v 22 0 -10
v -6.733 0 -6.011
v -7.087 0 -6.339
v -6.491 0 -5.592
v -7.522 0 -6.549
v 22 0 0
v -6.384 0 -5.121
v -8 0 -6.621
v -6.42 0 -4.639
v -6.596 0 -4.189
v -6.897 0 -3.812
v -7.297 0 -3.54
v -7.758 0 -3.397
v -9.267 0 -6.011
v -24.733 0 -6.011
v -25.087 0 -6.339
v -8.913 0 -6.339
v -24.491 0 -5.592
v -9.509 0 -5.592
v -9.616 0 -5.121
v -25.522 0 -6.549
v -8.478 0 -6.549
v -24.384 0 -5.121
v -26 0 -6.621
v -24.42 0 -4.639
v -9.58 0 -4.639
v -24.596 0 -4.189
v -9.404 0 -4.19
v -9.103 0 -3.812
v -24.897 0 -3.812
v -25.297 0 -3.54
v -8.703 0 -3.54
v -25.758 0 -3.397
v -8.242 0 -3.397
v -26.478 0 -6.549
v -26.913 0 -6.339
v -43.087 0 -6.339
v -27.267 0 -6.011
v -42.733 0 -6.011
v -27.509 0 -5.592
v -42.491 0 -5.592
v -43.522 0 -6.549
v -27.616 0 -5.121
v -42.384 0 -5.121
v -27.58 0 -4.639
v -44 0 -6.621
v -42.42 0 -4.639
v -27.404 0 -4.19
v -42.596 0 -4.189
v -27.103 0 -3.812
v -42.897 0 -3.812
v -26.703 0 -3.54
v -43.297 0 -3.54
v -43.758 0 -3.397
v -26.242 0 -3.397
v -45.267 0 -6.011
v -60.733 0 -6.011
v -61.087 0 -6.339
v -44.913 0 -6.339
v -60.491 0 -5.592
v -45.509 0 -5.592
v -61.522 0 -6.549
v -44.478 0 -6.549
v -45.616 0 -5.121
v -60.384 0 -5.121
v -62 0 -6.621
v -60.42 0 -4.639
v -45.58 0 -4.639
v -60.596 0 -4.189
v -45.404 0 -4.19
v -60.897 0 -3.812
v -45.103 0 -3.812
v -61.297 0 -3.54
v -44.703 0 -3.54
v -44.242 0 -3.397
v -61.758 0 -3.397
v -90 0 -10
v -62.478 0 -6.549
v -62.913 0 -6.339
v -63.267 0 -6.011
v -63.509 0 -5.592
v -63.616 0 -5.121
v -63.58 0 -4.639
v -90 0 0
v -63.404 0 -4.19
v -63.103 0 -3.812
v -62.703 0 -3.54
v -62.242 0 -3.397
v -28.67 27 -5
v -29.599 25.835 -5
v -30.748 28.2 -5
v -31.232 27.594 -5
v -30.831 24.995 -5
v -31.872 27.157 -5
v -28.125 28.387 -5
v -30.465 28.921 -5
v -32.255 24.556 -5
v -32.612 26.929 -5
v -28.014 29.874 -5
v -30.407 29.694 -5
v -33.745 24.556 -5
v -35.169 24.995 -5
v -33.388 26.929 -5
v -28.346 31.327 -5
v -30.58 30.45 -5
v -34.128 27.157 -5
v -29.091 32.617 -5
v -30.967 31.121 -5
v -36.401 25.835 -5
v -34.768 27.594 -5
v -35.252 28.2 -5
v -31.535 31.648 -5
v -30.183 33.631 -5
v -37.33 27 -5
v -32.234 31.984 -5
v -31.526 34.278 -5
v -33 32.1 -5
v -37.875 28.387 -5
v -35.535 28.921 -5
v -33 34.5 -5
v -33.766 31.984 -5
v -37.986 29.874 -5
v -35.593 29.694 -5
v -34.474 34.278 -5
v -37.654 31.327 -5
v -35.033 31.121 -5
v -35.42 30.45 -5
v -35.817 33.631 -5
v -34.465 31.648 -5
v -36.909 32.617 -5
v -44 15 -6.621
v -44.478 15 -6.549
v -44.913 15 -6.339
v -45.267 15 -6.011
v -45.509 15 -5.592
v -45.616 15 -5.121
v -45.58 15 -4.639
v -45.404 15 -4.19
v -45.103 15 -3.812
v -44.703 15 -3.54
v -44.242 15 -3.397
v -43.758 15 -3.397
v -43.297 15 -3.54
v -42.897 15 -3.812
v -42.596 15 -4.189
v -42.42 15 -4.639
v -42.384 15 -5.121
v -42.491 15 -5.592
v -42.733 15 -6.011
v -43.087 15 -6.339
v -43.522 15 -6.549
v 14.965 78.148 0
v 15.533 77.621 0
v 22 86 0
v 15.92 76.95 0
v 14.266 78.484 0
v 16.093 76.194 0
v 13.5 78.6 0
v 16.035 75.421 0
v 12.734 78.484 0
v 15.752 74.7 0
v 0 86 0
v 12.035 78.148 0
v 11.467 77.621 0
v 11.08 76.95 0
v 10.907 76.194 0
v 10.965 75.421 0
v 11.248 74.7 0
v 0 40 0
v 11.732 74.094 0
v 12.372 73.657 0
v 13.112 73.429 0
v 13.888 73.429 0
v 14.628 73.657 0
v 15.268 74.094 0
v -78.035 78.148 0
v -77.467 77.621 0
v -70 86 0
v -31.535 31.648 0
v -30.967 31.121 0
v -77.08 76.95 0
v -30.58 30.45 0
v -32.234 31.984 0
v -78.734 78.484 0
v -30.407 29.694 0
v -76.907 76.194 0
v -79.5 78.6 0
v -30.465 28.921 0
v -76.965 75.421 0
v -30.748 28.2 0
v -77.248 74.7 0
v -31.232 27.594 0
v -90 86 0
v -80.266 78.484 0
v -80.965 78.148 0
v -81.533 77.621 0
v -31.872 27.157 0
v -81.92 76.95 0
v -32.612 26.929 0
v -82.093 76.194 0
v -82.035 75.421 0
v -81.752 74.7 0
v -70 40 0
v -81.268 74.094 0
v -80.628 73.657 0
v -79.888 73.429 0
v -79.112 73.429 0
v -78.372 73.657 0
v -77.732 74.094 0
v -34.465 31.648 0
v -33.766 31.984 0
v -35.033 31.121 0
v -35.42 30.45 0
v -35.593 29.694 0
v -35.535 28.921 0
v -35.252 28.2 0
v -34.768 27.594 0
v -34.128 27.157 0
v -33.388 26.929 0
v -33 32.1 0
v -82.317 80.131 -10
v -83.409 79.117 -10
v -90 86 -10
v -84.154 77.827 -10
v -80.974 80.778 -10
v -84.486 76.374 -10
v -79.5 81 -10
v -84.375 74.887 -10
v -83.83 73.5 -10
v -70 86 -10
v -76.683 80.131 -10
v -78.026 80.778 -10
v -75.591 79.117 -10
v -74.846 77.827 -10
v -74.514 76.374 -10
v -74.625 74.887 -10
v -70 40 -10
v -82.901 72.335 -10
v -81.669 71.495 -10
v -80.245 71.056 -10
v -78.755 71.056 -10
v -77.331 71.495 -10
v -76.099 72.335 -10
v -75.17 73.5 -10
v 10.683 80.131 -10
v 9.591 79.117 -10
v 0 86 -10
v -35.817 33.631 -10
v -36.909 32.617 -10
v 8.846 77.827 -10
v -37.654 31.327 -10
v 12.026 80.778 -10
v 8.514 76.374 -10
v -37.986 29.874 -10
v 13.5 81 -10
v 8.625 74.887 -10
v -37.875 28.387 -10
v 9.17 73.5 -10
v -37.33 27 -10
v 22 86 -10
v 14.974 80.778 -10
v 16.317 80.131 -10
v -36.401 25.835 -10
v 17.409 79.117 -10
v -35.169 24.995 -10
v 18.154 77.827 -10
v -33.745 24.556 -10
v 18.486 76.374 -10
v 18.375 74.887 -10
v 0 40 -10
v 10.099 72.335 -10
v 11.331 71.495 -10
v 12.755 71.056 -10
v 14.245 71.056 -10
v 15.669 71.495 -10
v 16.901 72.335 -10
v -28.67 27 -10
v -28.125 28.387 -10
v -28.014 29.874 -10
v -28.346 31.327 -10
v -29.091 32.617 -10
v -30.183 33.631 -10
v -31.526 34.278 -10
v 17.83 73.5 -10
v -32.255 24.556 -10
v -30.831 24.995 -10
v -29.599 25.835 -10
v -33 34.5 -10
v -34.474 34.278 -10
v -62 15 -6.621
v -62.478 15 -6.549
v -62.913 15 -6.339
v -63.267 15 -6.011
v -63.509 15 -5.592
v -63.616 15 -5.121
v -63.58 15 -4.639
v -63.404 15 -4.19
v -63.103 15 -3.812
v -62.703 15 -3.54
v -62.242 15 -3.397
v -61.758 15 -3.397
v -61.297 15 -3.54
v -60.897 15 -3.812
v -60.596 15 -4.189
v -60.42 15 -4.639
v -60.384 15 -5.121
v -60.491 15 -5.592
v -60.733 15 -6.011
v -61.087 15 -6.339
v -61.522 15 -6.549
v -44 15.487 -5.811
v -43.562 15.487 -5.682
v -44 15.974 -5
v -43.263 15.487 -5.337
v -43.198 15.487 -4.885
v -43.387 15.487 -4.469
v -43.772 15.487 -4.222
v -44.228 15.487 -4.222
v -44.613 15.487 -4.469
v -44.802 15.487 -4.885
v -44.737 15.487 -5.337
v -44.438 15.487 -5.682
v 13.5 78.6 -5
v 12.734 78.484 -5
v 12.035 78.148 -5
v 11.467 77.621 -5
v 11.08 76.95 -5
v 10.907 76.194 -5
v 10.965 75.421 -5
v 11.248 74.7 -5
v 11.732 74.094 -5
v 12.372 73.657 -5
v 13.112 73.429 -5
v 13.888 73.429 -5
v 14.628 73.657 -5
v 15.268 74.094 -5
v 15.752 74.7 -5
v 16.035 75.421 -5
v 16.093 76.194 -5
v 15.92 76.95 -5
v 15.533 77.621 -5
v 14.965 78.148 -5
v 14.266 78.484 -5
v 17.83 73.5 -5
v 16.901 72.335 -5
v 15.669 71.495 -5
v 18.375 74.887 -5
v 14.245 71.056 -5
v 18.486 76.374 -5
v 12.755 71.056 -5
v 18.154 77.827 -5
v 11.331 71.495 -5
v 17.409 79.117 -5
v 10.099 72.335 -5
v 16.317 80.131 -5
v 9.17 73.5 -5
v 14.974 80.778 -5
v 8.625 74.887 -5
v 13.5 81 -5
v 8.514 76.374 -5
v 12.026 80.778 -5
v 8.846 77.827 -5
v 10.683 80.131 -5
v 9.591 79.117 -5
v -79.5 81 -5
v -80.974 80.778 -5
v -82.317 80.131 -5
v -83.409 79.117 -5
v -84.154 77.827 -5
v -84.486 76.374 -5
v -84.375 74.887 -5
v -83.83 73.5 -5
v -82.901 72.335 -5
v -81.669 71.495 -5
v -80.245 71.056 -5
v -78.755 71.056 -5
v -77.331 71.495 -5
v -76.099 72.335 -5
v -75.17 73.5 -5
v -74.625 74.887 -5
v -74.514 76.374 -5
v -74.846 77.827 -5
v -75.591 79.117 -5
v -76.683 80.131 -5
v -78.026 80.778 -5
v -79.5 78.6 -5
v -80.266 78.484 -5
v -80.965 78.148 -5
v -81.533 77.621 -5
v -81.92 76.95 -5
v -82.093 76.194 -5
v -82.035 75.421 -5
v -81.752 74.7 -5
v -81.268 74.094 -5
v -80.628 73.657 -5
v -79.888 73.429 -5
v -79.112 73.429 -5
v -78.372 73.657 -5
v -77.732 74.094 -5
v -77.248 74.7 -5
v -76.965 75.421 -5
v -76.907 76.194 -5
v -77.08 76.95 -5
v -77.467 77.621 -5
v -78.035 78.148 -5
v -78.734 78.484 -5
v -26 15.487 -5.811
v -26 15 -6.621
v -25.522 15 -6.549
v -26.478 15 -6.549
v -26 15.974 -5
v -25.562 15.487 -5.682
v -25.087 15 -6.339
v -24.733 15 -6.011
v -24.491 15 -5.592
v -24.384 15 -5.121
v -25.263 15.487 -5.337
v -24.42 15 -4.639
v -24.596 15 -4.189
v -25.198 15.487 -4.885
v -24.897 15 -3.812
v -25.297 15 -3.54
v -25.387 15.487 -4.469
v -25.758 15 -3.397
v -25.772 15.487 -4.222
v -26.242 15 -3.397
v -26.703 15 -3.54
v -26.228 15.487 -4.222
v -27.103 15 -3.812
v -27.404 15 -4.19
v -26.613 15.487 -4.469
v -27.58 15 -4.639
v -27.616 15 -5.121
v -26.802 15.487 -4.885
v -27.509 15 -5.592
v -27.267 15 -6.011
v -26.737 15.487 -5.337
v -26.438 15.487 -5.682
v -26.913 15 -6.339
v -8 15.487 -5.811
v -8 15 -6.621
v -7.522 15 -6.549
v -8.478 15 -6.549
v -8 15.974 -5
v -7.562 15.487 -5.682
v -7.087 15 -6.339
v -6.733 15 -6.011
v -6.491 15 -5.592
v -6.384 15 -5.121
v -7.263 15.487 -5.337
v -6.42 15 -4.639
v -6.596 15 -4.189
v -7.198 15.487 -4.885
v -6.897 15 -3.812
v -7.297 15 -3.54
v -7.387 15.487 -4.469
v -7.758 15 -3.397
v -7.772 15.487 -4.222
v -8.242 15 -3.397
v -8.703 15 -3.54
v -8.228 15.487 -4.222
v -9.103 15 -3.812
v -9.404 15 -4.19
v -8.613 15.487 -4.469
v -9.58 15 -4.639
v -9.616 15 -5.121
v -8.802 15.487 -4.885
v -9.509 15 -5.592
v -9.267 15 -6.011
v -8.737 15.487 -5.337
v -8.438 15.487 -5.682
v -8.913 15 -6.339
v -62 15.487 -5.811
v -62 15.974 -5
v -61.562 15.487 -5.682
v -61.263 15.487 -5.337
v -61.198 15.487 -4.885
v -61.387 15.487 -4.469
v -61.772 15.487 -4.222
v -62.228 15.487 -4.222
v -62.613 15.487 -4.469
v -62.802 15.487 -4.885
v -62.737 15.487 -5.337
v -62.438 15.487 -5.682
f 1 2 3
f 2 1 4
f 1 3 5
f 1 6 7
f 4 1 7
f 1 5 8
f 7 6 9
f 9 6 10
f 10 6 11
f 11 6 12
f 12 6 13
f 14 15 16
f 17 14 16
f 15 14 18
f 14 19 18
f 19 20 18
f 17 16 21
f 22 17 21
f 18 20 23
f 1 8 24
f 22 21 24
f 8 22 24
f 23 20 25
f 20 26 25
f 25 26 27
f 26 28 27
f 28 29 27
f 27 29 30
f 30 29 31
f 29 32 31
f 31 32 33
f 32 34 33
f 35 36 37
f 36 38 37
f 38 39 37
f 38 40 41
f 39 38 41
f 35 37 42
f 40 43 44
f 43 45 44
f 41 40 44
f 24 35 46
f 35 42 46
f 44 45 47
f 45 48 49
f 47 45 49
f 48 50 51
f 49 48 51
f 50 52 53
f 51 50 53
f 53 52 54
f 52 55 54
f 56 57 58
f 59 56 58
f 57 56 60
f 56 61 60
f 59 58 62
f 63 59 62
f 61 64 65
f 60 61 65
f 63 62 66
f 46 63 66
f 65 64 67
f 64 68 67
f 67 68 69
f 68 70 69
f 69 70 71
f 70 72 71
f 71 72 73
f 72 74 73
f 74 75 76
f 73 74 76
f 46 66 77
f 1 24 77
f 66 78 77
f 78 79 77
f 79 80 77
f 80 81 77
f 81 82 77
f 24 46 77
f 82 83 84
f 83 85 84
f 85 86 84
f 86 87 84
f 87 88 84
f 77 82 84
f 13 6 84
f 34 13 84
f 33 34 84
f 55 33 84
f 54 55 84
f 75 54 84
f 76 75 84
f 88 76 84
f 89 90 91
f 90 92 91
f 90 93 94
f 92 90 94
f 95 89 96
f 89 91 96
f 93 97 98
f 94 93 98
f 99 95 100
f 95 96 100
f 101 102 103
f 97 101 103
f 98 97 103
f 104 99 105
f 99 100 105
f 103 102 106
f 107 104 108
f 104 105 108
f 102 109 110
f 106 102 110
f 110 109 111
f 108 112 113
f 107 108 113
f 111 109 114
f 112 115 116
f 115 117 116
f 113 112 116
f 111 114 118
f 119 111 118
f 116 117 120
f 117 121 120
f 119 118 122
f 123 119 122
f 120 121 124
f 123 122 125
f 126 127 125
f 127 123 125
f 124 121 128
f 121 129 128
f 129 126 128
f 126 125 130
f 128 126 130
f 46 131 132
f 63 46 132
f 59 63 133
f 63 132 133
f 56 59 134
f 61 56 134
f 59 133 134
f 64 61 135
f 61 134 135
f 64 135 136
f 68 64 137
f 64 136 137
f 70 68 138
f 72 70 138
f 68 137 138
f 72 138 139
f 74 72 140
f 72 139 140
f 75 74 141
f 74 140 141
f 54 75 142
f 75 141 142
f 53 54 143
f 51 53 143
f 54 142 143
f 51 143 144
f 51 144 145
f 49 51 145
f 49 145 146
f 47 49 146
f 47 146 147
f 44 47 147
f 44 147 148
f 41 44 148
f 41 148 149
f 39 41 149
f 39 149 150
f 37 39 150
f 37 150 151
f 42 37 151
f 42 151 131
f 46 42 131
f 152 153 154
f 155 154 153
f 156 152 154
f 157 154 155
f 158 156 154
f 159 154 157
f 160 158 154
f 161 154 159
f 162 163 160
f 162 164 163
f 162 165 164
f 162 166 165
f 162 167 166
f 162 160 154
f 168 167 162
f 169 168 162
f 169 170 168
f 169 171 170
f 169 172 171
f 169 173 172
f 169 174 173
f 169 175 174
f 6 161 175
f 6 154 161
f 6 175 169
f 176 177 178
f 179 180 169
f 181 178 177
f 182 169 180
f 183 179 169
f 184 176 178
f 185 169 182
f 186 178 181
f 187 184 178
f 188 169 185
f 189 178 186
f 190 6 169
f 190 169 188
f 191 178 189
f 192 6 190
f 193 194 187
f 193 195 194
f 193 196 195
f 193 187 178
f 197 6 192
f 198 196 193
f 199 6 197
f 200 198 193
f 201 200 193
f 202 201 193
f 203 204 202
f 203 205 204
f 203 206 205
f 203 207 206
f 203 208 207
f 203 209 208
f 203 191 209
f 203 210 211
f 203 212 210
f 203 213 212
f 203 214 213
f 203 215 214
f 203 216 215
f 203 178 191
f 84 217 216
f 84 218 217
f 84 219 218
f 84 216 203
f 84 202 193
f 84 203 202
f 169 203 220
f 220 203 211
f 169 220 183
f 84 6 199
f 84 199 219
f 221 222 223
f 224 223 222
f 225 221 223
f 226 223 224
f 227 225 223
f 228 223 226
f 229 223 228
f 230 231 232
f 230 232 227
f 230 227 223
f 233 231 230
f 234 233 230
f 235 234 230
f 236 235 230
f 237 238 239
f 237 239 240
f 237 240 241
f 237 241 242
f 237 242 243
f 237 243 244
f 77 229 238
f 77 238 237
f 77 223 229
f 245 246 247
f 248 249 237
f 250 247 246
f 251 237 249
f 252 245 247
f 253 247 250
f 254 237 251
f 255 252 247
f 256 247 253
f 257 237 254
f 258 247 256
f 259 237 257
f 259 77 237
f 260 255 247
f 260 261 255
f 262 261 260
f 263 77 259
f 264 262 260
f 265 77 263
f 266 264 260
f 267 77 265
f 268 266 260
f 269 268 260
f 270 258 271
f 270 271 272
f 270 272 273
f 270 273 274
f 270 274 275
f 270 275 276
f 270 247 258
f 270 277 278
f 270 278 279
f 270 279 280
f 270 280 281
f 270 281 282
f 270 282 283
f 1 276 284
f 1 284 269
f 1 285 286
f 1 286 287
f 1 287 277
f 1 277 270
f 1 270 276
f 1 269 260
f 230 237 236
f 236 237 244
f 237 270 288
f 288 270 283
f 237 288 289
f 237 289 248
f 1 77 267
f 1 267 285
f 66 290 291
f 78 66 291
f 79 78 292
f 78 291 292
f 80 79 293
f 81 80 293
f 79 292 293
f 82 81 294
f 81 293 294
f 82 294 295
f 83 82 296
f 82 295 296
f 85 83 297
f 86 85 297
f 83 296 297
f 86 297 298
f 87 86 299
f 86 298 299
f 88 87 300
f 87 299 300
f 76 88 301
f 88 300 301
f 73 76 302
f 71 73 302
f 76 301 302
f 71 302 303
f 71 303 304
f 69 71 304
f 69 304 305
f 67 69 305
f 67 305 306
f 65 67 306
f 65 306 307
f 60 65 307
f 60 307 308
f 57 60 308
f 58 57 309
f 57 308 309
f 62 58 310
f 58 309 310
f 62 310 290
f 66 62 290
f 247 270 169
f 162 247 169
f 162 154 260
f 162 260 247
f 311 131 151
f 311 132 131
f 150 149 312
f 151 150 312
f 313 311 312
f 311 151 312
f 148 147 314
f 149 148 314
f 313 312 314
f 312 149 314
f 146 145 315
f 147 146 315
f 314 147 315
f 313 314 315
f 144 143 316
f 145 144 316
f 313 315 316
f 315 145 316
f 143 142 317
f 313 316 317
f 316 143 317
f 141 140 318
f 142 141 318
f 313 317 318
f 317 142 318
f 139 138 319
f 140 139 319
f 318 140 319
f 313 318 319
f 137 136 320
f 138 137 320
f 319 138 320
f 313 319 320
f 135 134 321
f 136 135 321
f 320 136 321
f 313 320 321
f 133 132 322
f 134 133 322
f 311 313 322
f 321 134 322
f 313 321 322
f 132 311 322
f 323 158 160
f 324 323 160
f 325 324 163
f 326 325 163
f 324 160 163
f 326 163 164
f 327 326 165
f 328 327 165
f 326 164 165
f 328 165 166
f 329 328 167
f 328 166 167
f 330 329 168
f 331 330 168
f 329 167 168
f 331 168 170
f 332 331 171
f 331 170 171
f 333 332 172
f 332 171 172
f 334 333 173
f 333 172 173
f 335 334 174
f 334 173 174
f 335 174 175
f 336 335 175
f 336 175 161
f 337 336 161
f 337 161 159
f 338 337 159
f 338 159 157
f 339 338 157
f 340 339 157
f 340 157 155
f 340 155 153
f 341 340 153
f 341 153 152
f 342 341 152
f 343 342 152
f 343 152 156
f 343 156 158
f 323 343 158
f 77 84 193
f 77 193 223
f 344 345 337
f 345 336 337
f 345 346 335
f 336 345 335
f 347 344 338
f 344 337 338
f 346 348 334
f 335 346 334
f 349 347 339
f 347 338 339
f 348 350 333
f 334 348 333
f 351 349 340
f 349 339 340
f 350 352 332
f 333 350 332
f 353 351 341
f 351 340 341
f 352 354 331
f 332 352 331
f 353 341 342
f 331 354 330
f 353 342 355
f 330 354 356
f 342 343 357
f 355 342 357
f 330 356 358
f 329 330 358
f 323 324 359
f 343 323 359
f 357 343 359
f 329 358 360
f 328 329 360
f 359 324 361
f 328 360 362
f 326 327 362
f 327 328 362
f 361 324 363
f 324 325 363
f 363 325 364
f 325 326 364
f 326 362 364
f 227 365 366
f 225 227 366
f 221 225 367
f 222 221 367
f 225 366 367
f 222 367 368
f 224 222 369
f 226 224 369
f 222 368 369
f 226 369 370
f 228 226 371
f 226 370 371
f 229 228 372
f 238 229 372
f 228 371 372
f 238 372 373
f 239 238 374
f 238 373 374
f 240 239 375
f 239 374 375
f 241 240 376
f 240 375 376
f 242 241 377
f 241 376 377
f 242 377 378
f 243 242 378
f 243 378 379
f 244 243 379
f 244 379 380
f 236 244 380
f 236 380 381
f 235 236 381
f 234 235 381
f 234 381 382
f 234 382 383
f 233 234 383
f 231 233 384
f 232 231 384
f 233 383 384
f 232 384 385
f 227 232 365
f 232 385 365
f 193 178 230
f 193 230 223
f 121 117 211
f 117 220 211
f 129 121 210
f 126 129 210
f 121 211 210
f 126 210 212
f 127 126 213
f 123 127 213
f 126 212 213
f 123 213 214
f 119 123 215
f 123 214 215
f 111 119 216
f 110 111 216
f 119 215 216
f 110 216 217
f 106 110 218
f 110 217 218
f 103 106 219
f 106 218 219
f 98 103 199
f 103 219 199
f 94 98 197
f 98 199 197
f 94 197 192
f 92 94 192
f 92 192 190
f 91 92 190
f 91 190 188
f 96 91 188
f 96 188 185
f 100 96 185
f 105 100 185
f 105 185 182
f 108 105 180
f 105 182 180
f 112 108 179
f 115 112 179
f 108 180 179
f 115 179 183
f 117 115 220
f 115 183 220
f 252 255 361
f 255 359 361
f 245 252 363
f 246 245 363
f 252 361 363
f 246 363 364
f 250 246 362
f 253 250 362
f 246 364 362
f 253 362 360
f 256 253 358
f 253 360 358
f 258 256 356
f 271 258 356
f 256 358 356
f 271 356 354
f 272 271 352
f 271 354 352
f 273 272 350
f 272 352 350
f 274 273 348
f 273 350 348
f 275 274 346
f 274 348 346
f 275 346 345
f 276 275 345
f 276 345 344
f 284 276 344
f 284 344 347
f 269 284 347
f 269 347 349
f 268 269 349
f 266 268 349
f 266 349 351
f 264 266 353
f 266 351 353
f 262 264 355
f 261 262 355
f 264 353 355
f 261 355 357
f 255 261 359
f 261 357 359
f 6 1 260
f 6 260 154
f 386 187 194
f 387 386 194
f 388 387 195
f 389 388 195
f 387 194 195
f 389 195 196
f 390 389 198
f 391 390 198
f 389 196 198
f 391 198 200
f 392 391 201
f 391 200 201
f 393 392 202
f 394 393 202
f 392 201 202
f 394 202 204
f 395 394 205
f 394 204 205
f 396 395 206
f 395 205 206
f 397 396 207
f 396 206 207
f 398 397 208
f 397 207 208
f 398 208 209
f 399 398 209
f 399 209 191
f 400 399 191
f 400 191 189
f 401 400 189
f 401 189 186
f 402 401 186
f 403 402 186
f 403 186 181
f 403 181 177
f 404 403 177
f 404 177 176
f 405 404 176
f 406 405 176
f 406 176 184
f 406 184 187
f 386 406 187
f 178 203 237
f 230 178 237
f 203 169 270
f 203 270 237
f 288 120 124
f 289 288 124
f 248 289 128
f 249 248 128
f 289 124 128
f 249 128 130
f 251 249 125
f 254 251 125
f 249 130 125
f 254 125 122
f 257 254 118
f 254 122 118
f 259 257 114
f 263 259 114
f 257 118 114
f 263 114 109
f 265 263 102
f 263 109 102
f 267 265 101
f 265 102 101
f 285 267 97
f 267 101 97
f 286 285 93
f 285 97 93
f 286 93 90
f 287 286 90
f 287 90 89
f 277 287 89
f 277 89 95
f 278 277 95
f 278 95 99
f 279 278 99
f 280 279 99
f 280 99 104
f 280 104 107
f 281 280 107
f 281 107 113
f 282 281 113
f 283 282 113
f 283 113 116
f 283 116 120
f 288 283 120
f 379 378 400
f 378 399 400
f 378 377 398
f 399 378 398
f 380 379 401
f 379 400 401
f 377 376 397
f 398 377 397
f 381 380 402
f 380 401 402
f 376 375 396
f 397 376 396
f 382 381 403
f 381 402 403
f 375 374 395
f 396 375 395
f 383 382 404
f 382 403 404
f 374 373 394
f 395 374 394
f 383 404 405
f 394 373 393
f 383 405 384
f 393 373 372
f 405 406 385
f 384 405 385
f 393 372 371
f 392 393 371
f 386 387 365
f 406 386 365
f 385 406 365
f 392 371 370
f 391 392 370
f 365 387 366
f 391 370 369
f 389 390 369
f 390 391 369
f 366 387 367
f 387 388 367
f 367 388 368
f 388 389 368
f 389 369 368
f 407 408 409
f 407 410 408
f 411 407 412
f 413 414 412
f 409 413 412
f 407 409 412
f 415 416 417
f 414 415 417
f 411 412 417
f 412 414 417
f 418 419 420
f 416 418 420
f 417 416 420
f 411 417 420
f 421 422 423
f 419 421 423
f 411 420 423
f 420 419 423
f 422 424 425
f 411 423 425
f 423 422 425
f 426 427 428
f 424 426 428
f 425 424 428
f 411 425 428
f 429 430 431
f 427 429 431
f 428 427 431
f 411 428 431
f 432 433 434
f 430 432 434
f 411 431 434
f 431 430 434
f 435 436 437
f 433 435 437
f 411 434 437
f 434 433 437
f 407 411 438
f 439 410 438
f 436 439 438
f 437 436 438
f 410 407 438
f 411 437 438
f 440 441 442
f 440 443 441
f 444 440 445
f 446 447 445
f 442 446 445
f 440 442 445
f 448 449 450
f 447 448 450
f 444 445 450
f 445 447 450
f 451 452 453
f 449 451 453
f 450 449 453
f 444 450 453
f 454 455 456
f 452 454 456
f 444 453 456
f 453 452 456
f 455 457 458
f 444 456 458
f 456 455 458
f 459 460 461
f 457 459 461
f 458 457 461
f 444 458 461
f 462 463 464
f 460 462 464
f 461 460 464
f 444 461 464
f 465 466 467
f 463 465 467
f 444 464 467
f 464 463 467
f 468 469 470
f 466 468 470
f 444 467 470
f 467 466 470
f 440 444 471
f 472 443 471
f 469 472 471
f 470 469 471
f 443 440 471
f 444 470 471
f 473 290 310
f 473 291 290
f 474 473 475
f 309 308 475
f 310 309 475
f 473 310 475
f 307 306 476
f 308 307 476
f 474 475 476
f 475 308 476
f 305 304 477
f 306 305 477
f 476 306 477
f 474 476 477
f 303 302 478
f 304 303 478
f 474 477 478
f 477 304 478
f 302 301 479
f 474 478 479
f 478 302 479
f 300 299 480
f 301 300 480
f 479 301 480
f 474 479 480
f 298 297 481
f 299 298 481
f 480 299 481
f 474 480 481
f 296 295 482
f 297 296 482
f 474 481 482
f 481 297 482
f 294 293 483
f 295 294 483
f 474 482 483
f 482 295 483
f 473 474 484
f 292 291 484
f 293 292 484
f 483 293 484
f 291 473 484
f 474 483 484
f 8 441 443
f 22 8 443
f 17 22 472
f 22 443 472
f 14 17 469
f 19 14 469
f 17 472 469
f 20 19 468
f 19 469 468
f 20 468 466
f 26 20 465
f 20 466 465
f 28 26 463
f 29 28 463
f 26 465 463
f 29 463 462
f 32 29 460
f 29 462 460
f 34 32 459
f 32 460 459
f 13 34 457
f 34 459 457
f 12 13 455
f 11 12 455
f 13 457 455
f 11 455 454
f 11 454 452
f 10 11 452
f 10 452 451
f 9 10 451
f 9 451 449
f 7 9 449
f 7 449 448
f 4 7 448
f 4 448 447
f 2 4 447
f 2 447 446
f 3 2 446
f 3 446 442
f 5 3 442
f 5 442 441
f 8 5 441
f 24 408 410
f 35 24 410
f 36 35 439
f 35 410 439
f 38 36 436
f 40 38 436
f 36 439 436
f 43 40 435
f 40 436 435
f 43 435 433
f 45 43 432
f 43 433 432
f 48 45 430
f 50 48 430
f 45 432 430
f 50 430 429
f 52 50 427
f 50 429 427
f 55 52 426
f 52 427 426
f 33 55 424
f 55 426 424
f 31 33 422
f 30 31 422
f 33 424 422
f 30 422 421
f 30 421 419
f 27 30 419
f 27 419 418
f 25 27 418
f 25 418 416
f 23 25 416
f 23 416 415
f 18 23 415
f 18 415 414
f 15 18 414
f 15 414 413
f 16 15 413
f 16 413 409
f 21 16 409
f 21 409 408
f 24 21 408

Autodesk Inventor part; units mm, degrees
ref_plane "YZ Plane" through (0, 0, 0) normal (1, 0, 0) x (0, 1, 0)
ref_plane "XZ Plane" through (0, 0, 0) normal (0, 1, 0) x (-1, 0, 0)
ref_plane "XY Plane" through (0, 0, 0) normal (0, 0, 1) x (1, 0, 0)
sketch "Sketch1" plane through (0, 0, 0) normal (0, 1, 0) x (-1, 0, 0)
  line L0 (0, 0) -> (70, 0)
  line L1 (70, 0) -> (70, -10)
  line L2 (70, -10) -> (0, -10)
  line L3 (0, -10) -> (0, 0)
  line L4 (70, 0) -> (0, 0)
  line L5 (0, 0) -> (0, -5)
  line L6 (0, -5) -> (70, -5)
  line L7 (70, -5) -> (70, 0)
  line L8 (70, -5) -> (62, -5)
  line L9 (62, -5) -> (44, -5)
  line L10 (44, -5) -> (26, -5)
  line L11 (26, -5) -> (8, -5)
  line L12 (8, -5) -> (-6, -5)
  line L13 (70, 0) -> (90, 0)
  line L14 (90, 0) -> (90, -10)
  line L15 (90, -10) -> (70, -10)
  line L16 (70, -10) -> (70, 0)
  line L17 (0, -10) -> (-22, -10)
  line L18 (-22, -10) -> (-22, 0)
  line L19 (-22, 0) -> (0, 0)
  line L20 (0, 0) -> (0, -10)
  dimension "d0" = 70
  dimension "d1" = 10
  dimension "d2" = 5
  dimension "d3" = 8
  dimension "d4" = 18
  dimension "d5" = 18
  dimension "d6" = 18
  dimension "d22" = 20
  dimension "d23" = 22
extrude "Extrusion1" add sketch "Sketch1" along normal blind 40 contours L0 L1 L6 L3 | L6 L1 L2 L3
hole "Hole1" at (6, 0, -5) at (-8, 0, -5) at (-26, 0, -5) at (-44, 0, -5) at (-62, 0, -5) direction (0, 1, 0) diameter 3.242 depth 15 tip angle 118 thread size "M4x0.7" class "6H" standard "ANSI Metric M Profile"
extrude "Extrusion3" add sketch "Sketch1" along normal blind 86 contours L3 L17 L18 L19 | L13 L14 L15 L1
sketch "Sketch4" plane through (22, 0, -10) normal (0, 0, -1) x (-1, 0, 0)
  line L0 (112, 0) -> (112, 86) projected
  line L1 (112, 86) -> (101.5, 86)
  line L2 (101.5, 86) -> (101.5, 76)
  line L3 (101.5, 76) -> (112, 76)
  line L4 (112, 76) -> (112, 86)
  line L5 (0, 86) -> (22, 86) projected
  line L6 (0, 86) -> (8.5, 86)
  line L7 (8.5, 86) -> (8.5, 76)
  line L8 (8.5, 76) -> (0, 76)
  line L9 (0, 76) -> (0, 86)
  line L10 (22, 40) -> (92, 40) projected
  line L11 (22, 40) -> (55, 40)
  line L12 (55, 40) -> (55, 29.5)
  line L13 (55, 29.5) -> (22, 29.5)
  line L14 (22, 29.5) -> (22, 40)
  point P0 (22, 0)
  dimension "d35" = 10.5
  dimension "d36" = 10
  dimension "d44" = 8.5
  dimension "d45" = 10
  dimension "d46" = 10.5
  dimension "d47" = 33
hole "Hole3" at (-79.5, 76, -10) at (13.5, 76, -10) at (-33, 29.5, -10) direction (0, 0, 1) diameter 5.2 end through all counterbore diameter 10 counterbore depth 5 clearance for "Socket Head Cap Screw" size "M5" standard "Ansi Metric M Profile"
properties part number "CameraAdapter_part2"
